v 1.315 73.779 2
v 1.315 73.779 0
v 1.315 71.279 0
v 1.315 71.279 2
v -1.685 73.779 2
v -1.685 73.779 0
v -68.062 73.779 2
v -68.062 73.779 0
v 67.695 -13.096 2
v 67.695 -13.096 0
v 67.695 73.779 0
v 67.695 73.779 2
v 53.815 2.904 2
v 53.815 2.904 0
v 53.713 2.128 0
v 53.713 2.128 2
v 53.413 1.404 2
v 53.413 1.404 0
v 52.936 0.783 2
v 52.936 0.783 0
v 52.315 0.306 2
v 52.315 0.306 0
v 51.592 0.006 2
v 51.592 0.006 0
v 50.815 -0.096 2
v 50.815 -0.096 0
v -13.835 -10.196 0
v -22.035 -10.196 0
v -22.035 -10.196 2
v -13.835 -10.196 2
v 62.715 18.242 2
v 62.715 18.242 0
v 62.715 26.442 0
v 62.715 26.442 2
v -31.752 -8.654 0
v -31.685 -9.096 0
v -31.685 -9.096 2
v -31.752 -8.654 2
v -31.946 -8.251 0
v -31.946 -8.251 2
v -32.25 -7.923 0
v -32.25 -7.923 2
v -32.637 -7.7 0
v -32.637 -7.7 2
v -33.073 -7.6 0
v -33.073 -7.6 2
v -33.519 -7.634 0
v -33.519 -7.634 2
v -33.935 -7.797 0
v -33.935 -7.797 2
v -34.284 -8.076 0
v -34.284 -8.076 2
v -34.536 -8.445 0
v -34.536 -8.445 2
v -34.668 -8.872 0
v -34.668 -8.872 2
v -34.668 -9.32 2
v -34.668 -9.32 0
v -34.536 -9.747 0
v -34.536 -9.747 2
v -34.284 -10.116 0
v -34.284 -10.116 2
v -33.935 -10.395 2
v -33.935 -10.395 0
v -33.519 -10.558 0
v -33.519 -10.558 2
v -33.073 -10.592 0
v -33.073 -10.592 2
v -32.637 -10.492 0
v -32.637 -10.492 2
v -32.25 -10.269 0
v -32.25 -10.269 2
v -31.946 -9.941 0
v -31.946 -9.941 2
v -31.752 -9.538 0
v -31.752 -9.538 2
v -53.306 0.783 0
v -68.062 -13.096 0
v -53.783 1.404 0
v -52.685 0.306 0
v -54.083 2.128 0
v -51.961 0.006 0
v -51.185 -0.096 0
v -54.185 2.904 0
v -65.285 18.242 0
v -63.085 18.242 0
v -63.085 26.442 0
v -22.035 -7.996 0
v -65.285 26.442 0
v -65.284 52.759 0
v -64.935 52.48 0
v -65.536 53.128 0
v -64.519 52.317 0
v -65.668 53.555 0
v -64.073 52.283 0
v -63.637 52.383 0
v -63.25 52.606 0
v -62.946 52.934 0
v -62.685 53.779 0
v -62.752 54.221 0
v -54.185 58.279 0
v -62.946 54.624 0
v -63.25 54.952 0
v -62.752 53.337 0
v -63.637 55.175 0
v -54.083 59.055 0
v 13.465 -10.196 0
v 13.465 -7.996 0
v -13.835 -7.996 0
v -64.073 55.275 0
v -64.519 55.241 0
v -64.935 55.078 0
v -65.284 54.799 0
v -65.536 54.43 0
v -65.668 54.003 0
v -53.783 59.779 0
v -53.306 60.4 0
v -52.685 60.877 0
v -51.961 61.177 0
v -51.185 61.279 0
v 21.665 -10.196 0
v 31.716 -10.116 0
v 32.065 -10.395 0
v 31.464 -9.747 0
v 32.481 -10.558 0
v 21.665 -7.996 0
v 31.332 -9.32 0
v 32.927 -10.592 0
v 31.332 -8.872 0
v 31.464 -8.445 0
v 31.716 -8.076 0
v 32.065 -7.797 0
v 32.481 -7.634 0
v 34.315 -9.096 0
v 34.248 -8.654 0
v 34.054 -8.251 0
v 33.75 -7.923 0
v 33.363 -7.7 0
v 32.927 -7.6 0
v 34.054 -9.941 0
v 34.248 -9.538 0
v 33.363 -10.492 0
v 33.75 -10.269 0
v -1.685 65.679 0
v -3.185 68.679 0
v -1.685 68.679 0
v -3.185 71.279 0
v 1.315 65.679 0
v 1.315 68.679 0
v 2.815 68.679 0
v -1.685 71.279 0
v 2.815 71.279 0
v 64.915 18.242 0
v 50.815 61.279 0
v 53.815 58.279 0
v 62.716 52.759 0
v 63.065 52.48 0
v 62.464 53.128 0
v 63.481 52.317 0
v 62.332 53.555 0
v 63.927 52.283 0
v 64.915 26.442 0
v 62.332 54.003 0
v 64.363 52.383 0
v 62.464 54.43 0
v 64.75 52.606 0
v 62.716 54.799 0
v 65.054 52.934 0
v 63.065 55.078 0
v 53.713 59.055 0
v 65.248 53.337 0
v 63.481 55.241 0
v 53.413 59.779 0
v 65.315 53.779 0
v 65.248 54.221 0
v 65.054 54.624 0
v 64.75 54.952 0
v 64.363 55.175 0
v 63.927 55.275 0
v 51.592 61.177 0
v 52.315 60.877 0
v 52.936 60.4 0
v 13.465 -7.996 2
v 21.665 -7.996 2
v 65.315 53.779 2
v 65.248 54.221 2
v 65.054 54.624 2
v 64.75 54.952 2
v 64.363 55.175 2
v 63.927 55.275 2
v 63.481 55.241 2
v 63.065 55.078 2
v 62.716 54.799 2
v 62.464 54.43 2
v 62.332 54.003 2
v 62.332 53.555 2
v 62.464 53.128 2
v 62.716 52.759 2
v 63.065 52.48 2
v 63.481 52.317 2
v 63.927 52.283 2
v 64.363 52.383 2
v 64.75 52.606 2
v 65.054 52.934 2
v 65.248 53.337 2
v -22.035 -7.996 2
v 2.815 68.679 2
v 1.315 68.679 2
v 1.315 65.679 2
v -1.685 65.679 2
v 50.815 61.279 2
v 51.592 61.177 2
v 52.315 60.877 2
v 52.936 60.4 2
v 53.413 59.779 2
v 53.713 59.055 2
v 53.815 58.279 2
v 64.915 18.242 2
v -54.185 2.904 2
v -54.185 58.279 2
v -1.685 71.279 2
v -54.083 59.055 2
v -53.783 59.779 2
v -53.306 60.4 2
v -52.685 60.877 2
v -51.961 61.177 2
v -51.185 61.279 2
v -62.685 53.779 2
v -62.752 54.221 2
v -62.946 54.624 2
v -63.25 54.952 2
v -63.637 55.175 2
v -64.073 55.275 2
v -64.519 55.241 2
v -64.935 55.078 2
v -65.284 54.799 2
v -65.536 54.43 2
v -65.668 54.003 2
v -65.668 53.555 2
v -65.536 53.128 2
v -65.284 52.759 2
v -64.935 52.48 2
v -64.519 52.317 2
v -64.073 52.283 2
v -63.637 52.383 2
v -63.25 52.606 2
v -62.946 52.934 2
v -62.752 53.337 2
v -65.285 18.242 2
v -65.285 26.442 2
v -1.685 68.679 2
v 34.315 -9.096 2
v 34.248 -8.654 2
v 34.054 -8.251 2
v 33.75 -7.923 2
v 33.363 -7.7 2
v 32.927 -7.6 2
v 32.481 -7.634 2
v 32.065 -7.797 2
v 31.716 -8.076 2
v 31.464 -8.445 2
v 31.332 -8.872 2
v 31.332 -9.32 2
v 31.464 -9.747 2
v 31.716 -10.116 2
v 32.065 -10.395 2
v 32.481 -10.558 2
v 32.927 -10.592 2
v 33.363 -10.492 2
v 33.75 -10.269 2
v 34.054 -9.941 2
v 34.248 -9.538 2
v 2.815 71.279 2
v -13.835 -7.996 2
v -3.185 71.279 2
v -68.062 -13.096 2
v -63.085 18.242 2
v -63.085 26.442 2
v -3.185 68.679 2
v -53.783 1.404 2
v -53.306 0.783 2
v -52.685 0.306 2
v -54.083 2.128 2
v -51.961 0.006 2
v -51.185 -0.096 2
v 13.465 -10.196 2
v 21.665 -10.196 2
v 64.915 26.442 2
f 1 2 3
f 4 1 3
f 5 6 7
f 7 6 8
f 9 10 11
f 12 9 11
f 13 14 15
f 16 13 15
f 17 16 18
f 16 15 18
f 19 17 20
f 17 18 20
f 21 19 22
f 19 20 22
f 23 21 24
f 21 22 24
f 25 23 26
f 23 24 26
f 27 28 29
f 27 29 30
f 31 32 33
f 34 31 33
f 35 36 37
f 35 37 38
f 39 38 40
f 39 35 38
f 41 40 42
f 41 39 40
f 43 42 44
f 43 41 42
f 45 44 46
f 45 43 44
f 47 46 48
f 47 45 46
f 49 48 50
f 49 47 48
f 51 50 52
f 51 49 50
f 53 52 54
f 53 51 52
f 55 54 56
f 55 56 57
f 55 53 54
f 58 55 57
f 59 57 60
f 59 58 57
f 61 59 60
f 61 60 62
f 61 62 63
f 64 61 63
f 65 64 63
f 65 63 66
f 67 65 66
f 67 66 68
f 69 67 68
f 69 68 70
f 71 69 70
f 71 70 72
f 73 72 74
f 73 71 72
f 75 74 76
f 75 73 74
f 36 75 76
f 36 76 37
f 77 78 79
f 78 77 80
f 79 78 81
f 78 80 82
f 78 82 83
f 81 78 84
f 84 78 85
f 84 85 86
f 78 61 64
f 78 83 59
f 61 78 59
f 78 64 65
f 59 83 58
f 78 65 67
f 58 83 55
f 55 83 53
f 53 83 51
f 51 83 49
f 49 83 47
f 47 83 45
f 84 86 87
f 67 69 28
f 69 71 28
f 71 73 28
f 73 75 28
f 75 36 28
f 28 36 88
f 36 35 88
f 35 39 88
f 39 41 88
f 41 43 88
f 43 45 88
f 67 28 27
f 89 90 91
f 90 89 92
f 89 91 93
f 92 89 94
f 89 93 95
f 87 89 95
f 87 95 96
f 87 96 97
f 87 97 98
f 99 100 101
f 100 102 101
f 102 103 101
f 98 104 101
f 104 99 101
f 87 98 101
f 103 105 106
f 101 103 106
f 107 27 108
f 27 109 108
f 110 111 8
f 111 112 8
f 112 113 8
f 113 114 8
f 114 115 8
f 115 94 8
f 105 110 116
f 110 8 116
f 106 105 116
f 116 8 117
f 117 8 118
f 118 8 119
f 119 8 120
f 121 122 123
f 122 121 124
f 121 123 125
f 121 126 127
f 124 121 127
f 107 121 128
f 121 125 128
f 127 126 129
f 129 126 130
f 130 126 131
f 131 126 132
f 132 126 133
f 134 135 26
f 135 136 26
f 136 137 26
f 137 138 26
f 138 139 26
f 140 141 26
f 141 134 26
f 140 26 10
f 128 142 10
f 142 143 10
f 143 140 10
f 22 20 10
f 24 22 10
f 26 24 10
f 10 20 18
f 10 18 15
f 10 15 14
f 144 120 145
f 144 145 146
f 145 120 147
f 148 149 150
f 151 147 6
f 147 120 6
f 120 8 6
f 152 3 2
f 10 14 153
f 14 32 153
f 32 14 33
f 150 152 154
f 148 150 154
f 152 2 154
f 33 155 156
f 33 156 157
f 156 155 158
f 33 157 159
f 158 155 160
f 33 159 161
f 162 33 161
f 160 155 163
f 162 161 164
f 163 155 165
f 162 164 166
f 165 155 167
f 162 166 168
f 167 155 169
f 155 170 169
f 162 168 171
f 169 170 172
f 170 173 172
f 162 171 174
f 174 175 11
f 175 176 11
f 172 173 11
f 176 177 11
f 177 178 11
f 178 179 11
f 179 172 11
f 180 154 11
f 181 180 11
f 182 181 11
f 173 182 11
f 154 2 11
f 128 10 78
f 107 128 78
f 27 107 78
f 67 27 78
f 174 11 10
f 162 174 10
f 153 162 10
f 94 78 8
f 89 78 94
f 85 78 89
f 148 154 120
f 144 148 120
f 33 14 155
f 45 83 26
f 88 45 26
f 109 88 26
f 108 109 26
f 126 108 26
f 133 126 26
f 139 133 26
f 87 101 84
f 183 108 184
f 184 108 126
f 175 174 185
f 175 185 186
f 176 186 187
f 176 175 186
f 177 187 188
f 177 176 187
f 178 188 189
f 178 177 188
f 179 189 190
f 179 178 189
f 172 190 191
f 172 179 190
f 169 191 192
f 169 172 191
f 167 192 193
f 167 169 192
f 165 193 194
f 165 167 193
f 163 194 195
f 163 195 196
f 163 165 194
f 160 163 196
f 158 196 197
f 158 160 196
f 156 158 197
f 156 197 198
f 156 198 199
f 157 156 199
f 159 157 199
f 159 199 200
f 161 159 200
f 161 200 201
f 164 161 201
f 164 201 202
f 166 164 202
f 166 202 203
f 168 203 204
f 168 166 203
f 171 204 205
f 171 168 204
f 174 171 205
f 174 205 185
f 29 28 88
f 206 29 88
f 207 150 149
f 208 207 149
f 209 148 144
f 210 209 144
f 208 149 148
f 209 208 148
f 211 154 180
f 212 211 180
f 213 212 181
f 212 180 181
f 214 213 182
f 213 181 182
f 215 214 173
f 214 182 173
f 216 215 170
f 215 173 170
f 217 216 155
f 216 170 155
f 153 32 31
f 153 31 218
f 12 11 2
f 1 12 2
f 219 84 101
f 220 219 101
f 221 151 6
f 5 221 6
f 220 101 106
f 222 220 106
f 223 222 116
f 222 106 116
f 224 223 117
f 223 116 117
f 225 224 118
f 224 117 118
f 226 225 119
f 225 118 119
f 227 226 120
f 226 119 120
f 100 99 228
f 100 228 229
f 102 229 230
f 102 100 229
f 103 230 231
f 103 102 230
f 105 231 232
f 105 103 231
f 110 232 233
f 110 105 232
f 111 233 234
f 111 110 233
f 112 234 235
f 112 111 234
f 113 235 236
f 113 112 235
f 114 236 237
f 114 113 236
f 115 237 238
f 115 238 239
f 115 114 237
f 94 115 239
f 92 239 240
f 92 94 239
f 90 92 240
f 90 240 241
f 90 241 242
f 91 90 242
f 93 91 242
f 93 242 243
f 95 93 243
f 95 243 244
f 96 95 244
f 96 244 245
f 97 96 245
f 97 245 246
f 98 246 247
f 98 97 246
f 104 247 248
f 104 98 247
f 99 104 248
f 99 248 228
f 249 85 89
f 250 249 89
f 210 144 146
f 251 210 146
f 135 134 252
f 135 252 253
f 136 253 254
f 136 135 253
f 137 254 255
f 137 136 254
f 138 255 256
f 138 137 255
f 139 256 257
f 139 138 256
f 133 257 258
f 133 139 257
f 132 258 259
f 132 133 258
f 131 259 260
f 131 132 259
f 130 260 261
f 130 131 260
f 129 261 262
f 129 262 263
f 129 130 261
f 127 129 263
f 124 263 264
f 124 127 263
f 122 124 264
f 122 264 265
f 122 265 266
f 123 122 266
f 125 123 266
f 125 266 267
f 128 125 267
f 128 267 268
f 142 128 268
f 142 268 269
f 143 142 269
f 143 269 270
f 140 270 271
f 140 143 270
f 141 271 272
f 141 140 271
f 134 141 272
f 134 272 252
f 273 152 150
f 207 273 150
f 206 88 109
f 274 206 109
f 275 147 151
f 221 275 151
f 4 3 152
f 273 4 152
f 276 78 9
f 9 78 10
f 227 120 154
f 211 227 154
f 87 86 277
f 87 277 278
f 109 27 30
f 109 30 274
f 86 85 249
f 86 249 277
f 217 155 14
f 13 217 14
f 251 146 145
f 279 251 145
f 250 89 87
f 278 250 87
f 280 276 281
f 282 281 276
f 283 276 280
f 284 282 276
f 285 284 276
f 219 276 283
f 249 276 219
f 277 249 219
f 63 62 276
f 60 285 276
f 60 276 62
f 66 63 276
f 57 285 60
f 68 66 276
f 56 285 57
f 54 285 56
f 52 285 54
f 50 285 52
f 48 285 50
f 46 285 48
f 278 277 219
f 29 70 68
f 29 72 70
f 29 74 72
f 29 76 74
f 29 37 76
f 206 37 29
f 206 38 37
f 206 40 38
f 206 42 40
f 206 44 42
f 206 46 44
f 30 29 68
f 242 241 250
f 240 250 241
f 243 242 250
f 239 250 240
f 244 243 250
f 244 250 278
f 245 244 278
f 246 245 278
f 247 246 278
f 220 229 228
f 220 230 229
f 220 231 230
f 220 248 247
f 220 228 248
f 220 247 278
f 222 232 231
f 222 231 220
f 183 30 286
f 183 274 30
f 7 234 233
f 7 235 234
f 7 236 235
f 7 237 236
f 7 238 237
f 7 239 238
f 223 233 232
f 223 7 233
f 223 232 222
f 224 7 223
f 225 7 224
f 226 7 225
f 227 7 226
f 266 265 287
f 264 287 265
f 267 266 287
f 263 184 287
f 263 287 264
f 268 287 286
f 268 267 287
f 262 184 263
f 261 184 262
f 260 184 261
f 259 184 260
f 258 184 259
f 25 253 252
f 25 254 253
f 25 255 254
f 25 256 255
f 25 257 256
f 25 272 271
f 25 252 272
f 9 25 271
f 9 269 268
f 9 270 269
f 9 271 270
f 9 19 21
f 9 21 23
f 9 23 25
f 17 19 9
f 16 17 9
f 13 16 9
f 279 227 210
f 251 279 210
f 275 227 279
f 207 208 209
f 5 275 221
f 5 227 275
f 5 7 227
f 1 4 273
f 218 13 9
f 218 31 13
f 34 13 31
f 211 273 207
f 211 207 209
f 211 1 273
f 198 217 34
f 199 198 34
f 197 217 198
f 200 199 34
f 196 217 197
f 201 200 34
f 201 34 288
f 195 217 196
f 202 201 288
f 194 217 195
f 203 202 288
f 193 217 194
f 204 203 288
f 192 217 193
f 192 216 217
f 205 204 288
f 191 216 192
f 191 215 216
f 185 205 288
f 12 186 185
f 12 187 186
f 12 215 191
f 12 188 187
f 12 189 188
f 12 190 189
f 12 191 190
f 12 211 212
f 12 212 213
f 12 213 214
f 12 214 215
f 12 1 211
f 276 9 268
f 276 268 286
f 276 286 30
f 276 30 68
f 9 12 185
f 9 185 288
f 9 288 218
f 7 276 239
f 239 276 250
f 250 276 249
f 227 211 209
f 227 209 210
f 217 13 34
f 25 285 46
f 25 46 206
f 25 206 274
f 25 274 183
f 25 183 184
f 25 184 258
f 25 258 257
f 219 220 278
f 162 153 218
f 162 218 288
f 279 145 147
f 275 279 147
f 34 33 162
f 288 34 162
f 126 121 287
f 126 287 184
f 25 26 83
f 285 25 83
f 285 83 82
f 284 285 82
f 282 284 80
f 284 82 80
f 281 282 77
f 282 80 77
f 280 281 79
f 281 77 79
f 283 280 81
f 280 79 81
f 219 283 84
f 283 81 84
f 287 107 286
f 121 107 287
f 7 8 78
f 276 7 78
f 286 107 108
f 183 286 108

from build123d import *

# Parameters (mm, degrees)
SKETCH_1_R      = 1.5
SKETCH_1_W      = 8.2
SKETCH_1_H      = 2.2
SKETCH_1_W_2    = 2.2
SKETCH_1_H_2    = 8.2
EXTRUDE_1_DEPTH = 2


with BuildPart() as part:
    # 草图1 → 凸台-拉伸1 (new body)
    with BuildSketch(Plane.XY):
        Polygon((-68.061769393, -13.095981945), (-52.184883937, -13.095981945), (-18.934883937, -13.095981945), (18.565116063, -13.095981945), (67.695116063, -13.095981945), (67.695116063, 73.779018055), (1.315116063, 73.779018055), (1.315116063, 71.279018055), (2.815116063, 71.279018055), (2.815116063, 68.679018055), (1.315116063, 68.679018055), (1.315116063, 65.679018055), (-1.684883937, 65.679018055), (-1.684883937, 68.679018055), (-3.184883937, 68.679018055), (-3.184883937, 71.279018055), (-1.684883937, 71.279018055), (-1.684883937, 73.779018055), (-68.061769393, 73.779018055), align=None)
        with Locations((-33.184883937, -9.095981945)):
            Circle(SKETCH_1_R, mode=Mode.SUBTRACT)
        with Locations((-17.934883937, -9.095981946)):
            Rectangle(SKETCH_1_W, SKETCH_1_H, mode=Mode.SUBTRACT)
        with Locations((-64.184883937, 22.341518055)):
            Rectangle(SKETCH_1_W_2, SKETCH_1_H_2, mode=Mode.SUBTRACT)
        with Locations((17.565116063, -9.095981946)):
            Rectangle(SKETCH_1_W, SKETCH_1_H, mode=Mode.SUBTRACT)
        with Locations((32.815116063, -9.095981945)):
            Circle(SKETCH_1_R, mode=Mode.SUBTRACT)
        with Locations((63.815116063, 22.341518055)):
            Rectangle(SKETCH_1_W_2, SKETCH_1_H_2, mode=Mode.SUBTRACT)
        with BuildLine():
            ThreePointArc((50.815116063, 61.279018055), (52.936436406, 60.400338398), (53.815116063, 58.279018055))
            Line((53.815116063, 58.279018055), (53.815116063, 2.904018055))
            ThreePointArc((53.815116063, 2.904018055), (52.936436406, 0.782697711), (50.815116063, -0.095981945))
            Line((50.815116063, -0.095981945), (-51.184883937, -0.095981945))
            ThreePointArc((-51.184883937, -0.095981945), (-53.306204281, 0.782697711), (-54.184883937, 2.904018055))
            Line((-54.184883937, 2.904018055), (-54.184883937, 58.279018055))
            ThreePointArc((-54.184883937, 58.279018055), (-53.306204281, 60.400338398), (-51.184883937, 61.279018055))
            Line((-51.184883937, 61.279018055), (50.815116063, 61.279018055))
        make_face(mode=Mode.SUBTRACT)
        with Locations((-64.184883937, 53.779018055)):
            Circle(SKETCH_1_R, mode=Mode.SUBTRACT)
        with Locations((63.815116063, 53.779018055)):
            Circle(SKETCH_1_R, mode=Mode.SUBTRACT)
    extrude(amount=EXTRUDE_1_DEPTH)


solid = part.part
